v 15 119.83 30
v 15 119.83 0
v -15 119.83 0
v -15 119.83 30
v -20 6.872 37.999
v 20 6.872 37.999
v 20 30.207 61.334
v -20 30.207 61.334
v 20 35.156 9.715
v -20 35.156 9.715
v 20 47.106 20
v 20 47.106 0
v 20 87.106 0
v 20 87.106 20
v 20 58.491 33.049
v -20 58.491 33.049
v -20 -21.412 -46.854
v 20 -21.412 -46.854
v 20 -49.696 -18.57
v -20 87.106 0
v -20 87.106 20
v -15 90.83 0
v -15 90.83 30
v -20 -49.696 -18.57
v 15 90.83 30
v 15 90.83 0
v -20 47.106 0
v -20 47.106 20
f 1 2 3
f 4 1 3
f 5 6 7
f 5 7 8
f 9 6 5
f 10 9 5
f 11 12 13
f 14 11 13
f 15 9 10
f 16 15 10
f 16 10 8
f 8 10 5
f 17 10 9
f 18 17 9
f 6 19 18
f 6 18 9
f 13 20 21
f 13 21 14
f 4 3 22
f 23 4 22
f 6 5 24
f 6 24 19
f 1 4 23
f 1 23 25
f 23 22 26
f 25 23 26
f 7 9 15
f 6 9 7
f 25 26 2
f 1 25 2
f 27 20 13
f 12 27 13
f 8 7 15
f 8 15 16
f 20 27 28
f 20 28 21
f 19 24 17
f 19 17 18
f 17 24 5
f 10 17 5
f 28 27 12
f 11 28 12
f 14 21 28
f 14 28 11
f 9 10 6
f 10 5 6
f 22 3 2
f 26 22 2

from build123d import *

# Parameters (mm, degrees)
F3_W      = 40
F3_H      = 80
F4_DEPTH  = 20
F5_W      = 40
F5_H      = 40
F6_DEPTH  = 20
F4_FACE_W = 40
F4_FACE_H = 40
F7_DEPTH  = 33
F9_DEPTH  = 30


with BuildPart() as f4:
    # F3 (on face) → F4 (new body, symmetric)
    with BuildSketch(Plane(origin=(0, -1.421282, 1.421282), x_dir=(1, 0, 0), z_dir=(0, -0.707107, 0.707107))):
        with Locations((0, -8.271298)):
            Rectangle(F3_W, F3_H)
    extrude(amount=F4_DEPTH, both=True)


with BuildPart() as f6:
    # F5 (on Top) → F6 (new body)
    with BuildSketch(Plane.XY):
        with Locations((0, 67.105919)):
            Rectangle(F5_W, F5_H)
    extrude(amount=F6_DEPTH)


with BuildPart() as f7:
    # F4_face (on face) → F7 (new body)
    with BuildSketch(Plane(origin=(0, 21.014298, 23.856862), x_dir=(-1, 0, 0), z_dir=(0, 0.707107, 0.707107))):
        Rectangle(F4_FACE_W, F4_FACE_H)
    extrude(amount=F7_DEPTH)


with BuildPart() as f9:
    # F8 (on Top) → F9 (new body)
    with BuildSketch(Plane.XY):
        Polygon((15, 90.830199), (15, 119.830199), (-15, 119.830199), (-15, 90.830199), (0, 90.830199), align=None)
    extrude(amount=F9_DEPTH)


solid = Compound([f4.part, f6.part, f7.part, f9.part])
